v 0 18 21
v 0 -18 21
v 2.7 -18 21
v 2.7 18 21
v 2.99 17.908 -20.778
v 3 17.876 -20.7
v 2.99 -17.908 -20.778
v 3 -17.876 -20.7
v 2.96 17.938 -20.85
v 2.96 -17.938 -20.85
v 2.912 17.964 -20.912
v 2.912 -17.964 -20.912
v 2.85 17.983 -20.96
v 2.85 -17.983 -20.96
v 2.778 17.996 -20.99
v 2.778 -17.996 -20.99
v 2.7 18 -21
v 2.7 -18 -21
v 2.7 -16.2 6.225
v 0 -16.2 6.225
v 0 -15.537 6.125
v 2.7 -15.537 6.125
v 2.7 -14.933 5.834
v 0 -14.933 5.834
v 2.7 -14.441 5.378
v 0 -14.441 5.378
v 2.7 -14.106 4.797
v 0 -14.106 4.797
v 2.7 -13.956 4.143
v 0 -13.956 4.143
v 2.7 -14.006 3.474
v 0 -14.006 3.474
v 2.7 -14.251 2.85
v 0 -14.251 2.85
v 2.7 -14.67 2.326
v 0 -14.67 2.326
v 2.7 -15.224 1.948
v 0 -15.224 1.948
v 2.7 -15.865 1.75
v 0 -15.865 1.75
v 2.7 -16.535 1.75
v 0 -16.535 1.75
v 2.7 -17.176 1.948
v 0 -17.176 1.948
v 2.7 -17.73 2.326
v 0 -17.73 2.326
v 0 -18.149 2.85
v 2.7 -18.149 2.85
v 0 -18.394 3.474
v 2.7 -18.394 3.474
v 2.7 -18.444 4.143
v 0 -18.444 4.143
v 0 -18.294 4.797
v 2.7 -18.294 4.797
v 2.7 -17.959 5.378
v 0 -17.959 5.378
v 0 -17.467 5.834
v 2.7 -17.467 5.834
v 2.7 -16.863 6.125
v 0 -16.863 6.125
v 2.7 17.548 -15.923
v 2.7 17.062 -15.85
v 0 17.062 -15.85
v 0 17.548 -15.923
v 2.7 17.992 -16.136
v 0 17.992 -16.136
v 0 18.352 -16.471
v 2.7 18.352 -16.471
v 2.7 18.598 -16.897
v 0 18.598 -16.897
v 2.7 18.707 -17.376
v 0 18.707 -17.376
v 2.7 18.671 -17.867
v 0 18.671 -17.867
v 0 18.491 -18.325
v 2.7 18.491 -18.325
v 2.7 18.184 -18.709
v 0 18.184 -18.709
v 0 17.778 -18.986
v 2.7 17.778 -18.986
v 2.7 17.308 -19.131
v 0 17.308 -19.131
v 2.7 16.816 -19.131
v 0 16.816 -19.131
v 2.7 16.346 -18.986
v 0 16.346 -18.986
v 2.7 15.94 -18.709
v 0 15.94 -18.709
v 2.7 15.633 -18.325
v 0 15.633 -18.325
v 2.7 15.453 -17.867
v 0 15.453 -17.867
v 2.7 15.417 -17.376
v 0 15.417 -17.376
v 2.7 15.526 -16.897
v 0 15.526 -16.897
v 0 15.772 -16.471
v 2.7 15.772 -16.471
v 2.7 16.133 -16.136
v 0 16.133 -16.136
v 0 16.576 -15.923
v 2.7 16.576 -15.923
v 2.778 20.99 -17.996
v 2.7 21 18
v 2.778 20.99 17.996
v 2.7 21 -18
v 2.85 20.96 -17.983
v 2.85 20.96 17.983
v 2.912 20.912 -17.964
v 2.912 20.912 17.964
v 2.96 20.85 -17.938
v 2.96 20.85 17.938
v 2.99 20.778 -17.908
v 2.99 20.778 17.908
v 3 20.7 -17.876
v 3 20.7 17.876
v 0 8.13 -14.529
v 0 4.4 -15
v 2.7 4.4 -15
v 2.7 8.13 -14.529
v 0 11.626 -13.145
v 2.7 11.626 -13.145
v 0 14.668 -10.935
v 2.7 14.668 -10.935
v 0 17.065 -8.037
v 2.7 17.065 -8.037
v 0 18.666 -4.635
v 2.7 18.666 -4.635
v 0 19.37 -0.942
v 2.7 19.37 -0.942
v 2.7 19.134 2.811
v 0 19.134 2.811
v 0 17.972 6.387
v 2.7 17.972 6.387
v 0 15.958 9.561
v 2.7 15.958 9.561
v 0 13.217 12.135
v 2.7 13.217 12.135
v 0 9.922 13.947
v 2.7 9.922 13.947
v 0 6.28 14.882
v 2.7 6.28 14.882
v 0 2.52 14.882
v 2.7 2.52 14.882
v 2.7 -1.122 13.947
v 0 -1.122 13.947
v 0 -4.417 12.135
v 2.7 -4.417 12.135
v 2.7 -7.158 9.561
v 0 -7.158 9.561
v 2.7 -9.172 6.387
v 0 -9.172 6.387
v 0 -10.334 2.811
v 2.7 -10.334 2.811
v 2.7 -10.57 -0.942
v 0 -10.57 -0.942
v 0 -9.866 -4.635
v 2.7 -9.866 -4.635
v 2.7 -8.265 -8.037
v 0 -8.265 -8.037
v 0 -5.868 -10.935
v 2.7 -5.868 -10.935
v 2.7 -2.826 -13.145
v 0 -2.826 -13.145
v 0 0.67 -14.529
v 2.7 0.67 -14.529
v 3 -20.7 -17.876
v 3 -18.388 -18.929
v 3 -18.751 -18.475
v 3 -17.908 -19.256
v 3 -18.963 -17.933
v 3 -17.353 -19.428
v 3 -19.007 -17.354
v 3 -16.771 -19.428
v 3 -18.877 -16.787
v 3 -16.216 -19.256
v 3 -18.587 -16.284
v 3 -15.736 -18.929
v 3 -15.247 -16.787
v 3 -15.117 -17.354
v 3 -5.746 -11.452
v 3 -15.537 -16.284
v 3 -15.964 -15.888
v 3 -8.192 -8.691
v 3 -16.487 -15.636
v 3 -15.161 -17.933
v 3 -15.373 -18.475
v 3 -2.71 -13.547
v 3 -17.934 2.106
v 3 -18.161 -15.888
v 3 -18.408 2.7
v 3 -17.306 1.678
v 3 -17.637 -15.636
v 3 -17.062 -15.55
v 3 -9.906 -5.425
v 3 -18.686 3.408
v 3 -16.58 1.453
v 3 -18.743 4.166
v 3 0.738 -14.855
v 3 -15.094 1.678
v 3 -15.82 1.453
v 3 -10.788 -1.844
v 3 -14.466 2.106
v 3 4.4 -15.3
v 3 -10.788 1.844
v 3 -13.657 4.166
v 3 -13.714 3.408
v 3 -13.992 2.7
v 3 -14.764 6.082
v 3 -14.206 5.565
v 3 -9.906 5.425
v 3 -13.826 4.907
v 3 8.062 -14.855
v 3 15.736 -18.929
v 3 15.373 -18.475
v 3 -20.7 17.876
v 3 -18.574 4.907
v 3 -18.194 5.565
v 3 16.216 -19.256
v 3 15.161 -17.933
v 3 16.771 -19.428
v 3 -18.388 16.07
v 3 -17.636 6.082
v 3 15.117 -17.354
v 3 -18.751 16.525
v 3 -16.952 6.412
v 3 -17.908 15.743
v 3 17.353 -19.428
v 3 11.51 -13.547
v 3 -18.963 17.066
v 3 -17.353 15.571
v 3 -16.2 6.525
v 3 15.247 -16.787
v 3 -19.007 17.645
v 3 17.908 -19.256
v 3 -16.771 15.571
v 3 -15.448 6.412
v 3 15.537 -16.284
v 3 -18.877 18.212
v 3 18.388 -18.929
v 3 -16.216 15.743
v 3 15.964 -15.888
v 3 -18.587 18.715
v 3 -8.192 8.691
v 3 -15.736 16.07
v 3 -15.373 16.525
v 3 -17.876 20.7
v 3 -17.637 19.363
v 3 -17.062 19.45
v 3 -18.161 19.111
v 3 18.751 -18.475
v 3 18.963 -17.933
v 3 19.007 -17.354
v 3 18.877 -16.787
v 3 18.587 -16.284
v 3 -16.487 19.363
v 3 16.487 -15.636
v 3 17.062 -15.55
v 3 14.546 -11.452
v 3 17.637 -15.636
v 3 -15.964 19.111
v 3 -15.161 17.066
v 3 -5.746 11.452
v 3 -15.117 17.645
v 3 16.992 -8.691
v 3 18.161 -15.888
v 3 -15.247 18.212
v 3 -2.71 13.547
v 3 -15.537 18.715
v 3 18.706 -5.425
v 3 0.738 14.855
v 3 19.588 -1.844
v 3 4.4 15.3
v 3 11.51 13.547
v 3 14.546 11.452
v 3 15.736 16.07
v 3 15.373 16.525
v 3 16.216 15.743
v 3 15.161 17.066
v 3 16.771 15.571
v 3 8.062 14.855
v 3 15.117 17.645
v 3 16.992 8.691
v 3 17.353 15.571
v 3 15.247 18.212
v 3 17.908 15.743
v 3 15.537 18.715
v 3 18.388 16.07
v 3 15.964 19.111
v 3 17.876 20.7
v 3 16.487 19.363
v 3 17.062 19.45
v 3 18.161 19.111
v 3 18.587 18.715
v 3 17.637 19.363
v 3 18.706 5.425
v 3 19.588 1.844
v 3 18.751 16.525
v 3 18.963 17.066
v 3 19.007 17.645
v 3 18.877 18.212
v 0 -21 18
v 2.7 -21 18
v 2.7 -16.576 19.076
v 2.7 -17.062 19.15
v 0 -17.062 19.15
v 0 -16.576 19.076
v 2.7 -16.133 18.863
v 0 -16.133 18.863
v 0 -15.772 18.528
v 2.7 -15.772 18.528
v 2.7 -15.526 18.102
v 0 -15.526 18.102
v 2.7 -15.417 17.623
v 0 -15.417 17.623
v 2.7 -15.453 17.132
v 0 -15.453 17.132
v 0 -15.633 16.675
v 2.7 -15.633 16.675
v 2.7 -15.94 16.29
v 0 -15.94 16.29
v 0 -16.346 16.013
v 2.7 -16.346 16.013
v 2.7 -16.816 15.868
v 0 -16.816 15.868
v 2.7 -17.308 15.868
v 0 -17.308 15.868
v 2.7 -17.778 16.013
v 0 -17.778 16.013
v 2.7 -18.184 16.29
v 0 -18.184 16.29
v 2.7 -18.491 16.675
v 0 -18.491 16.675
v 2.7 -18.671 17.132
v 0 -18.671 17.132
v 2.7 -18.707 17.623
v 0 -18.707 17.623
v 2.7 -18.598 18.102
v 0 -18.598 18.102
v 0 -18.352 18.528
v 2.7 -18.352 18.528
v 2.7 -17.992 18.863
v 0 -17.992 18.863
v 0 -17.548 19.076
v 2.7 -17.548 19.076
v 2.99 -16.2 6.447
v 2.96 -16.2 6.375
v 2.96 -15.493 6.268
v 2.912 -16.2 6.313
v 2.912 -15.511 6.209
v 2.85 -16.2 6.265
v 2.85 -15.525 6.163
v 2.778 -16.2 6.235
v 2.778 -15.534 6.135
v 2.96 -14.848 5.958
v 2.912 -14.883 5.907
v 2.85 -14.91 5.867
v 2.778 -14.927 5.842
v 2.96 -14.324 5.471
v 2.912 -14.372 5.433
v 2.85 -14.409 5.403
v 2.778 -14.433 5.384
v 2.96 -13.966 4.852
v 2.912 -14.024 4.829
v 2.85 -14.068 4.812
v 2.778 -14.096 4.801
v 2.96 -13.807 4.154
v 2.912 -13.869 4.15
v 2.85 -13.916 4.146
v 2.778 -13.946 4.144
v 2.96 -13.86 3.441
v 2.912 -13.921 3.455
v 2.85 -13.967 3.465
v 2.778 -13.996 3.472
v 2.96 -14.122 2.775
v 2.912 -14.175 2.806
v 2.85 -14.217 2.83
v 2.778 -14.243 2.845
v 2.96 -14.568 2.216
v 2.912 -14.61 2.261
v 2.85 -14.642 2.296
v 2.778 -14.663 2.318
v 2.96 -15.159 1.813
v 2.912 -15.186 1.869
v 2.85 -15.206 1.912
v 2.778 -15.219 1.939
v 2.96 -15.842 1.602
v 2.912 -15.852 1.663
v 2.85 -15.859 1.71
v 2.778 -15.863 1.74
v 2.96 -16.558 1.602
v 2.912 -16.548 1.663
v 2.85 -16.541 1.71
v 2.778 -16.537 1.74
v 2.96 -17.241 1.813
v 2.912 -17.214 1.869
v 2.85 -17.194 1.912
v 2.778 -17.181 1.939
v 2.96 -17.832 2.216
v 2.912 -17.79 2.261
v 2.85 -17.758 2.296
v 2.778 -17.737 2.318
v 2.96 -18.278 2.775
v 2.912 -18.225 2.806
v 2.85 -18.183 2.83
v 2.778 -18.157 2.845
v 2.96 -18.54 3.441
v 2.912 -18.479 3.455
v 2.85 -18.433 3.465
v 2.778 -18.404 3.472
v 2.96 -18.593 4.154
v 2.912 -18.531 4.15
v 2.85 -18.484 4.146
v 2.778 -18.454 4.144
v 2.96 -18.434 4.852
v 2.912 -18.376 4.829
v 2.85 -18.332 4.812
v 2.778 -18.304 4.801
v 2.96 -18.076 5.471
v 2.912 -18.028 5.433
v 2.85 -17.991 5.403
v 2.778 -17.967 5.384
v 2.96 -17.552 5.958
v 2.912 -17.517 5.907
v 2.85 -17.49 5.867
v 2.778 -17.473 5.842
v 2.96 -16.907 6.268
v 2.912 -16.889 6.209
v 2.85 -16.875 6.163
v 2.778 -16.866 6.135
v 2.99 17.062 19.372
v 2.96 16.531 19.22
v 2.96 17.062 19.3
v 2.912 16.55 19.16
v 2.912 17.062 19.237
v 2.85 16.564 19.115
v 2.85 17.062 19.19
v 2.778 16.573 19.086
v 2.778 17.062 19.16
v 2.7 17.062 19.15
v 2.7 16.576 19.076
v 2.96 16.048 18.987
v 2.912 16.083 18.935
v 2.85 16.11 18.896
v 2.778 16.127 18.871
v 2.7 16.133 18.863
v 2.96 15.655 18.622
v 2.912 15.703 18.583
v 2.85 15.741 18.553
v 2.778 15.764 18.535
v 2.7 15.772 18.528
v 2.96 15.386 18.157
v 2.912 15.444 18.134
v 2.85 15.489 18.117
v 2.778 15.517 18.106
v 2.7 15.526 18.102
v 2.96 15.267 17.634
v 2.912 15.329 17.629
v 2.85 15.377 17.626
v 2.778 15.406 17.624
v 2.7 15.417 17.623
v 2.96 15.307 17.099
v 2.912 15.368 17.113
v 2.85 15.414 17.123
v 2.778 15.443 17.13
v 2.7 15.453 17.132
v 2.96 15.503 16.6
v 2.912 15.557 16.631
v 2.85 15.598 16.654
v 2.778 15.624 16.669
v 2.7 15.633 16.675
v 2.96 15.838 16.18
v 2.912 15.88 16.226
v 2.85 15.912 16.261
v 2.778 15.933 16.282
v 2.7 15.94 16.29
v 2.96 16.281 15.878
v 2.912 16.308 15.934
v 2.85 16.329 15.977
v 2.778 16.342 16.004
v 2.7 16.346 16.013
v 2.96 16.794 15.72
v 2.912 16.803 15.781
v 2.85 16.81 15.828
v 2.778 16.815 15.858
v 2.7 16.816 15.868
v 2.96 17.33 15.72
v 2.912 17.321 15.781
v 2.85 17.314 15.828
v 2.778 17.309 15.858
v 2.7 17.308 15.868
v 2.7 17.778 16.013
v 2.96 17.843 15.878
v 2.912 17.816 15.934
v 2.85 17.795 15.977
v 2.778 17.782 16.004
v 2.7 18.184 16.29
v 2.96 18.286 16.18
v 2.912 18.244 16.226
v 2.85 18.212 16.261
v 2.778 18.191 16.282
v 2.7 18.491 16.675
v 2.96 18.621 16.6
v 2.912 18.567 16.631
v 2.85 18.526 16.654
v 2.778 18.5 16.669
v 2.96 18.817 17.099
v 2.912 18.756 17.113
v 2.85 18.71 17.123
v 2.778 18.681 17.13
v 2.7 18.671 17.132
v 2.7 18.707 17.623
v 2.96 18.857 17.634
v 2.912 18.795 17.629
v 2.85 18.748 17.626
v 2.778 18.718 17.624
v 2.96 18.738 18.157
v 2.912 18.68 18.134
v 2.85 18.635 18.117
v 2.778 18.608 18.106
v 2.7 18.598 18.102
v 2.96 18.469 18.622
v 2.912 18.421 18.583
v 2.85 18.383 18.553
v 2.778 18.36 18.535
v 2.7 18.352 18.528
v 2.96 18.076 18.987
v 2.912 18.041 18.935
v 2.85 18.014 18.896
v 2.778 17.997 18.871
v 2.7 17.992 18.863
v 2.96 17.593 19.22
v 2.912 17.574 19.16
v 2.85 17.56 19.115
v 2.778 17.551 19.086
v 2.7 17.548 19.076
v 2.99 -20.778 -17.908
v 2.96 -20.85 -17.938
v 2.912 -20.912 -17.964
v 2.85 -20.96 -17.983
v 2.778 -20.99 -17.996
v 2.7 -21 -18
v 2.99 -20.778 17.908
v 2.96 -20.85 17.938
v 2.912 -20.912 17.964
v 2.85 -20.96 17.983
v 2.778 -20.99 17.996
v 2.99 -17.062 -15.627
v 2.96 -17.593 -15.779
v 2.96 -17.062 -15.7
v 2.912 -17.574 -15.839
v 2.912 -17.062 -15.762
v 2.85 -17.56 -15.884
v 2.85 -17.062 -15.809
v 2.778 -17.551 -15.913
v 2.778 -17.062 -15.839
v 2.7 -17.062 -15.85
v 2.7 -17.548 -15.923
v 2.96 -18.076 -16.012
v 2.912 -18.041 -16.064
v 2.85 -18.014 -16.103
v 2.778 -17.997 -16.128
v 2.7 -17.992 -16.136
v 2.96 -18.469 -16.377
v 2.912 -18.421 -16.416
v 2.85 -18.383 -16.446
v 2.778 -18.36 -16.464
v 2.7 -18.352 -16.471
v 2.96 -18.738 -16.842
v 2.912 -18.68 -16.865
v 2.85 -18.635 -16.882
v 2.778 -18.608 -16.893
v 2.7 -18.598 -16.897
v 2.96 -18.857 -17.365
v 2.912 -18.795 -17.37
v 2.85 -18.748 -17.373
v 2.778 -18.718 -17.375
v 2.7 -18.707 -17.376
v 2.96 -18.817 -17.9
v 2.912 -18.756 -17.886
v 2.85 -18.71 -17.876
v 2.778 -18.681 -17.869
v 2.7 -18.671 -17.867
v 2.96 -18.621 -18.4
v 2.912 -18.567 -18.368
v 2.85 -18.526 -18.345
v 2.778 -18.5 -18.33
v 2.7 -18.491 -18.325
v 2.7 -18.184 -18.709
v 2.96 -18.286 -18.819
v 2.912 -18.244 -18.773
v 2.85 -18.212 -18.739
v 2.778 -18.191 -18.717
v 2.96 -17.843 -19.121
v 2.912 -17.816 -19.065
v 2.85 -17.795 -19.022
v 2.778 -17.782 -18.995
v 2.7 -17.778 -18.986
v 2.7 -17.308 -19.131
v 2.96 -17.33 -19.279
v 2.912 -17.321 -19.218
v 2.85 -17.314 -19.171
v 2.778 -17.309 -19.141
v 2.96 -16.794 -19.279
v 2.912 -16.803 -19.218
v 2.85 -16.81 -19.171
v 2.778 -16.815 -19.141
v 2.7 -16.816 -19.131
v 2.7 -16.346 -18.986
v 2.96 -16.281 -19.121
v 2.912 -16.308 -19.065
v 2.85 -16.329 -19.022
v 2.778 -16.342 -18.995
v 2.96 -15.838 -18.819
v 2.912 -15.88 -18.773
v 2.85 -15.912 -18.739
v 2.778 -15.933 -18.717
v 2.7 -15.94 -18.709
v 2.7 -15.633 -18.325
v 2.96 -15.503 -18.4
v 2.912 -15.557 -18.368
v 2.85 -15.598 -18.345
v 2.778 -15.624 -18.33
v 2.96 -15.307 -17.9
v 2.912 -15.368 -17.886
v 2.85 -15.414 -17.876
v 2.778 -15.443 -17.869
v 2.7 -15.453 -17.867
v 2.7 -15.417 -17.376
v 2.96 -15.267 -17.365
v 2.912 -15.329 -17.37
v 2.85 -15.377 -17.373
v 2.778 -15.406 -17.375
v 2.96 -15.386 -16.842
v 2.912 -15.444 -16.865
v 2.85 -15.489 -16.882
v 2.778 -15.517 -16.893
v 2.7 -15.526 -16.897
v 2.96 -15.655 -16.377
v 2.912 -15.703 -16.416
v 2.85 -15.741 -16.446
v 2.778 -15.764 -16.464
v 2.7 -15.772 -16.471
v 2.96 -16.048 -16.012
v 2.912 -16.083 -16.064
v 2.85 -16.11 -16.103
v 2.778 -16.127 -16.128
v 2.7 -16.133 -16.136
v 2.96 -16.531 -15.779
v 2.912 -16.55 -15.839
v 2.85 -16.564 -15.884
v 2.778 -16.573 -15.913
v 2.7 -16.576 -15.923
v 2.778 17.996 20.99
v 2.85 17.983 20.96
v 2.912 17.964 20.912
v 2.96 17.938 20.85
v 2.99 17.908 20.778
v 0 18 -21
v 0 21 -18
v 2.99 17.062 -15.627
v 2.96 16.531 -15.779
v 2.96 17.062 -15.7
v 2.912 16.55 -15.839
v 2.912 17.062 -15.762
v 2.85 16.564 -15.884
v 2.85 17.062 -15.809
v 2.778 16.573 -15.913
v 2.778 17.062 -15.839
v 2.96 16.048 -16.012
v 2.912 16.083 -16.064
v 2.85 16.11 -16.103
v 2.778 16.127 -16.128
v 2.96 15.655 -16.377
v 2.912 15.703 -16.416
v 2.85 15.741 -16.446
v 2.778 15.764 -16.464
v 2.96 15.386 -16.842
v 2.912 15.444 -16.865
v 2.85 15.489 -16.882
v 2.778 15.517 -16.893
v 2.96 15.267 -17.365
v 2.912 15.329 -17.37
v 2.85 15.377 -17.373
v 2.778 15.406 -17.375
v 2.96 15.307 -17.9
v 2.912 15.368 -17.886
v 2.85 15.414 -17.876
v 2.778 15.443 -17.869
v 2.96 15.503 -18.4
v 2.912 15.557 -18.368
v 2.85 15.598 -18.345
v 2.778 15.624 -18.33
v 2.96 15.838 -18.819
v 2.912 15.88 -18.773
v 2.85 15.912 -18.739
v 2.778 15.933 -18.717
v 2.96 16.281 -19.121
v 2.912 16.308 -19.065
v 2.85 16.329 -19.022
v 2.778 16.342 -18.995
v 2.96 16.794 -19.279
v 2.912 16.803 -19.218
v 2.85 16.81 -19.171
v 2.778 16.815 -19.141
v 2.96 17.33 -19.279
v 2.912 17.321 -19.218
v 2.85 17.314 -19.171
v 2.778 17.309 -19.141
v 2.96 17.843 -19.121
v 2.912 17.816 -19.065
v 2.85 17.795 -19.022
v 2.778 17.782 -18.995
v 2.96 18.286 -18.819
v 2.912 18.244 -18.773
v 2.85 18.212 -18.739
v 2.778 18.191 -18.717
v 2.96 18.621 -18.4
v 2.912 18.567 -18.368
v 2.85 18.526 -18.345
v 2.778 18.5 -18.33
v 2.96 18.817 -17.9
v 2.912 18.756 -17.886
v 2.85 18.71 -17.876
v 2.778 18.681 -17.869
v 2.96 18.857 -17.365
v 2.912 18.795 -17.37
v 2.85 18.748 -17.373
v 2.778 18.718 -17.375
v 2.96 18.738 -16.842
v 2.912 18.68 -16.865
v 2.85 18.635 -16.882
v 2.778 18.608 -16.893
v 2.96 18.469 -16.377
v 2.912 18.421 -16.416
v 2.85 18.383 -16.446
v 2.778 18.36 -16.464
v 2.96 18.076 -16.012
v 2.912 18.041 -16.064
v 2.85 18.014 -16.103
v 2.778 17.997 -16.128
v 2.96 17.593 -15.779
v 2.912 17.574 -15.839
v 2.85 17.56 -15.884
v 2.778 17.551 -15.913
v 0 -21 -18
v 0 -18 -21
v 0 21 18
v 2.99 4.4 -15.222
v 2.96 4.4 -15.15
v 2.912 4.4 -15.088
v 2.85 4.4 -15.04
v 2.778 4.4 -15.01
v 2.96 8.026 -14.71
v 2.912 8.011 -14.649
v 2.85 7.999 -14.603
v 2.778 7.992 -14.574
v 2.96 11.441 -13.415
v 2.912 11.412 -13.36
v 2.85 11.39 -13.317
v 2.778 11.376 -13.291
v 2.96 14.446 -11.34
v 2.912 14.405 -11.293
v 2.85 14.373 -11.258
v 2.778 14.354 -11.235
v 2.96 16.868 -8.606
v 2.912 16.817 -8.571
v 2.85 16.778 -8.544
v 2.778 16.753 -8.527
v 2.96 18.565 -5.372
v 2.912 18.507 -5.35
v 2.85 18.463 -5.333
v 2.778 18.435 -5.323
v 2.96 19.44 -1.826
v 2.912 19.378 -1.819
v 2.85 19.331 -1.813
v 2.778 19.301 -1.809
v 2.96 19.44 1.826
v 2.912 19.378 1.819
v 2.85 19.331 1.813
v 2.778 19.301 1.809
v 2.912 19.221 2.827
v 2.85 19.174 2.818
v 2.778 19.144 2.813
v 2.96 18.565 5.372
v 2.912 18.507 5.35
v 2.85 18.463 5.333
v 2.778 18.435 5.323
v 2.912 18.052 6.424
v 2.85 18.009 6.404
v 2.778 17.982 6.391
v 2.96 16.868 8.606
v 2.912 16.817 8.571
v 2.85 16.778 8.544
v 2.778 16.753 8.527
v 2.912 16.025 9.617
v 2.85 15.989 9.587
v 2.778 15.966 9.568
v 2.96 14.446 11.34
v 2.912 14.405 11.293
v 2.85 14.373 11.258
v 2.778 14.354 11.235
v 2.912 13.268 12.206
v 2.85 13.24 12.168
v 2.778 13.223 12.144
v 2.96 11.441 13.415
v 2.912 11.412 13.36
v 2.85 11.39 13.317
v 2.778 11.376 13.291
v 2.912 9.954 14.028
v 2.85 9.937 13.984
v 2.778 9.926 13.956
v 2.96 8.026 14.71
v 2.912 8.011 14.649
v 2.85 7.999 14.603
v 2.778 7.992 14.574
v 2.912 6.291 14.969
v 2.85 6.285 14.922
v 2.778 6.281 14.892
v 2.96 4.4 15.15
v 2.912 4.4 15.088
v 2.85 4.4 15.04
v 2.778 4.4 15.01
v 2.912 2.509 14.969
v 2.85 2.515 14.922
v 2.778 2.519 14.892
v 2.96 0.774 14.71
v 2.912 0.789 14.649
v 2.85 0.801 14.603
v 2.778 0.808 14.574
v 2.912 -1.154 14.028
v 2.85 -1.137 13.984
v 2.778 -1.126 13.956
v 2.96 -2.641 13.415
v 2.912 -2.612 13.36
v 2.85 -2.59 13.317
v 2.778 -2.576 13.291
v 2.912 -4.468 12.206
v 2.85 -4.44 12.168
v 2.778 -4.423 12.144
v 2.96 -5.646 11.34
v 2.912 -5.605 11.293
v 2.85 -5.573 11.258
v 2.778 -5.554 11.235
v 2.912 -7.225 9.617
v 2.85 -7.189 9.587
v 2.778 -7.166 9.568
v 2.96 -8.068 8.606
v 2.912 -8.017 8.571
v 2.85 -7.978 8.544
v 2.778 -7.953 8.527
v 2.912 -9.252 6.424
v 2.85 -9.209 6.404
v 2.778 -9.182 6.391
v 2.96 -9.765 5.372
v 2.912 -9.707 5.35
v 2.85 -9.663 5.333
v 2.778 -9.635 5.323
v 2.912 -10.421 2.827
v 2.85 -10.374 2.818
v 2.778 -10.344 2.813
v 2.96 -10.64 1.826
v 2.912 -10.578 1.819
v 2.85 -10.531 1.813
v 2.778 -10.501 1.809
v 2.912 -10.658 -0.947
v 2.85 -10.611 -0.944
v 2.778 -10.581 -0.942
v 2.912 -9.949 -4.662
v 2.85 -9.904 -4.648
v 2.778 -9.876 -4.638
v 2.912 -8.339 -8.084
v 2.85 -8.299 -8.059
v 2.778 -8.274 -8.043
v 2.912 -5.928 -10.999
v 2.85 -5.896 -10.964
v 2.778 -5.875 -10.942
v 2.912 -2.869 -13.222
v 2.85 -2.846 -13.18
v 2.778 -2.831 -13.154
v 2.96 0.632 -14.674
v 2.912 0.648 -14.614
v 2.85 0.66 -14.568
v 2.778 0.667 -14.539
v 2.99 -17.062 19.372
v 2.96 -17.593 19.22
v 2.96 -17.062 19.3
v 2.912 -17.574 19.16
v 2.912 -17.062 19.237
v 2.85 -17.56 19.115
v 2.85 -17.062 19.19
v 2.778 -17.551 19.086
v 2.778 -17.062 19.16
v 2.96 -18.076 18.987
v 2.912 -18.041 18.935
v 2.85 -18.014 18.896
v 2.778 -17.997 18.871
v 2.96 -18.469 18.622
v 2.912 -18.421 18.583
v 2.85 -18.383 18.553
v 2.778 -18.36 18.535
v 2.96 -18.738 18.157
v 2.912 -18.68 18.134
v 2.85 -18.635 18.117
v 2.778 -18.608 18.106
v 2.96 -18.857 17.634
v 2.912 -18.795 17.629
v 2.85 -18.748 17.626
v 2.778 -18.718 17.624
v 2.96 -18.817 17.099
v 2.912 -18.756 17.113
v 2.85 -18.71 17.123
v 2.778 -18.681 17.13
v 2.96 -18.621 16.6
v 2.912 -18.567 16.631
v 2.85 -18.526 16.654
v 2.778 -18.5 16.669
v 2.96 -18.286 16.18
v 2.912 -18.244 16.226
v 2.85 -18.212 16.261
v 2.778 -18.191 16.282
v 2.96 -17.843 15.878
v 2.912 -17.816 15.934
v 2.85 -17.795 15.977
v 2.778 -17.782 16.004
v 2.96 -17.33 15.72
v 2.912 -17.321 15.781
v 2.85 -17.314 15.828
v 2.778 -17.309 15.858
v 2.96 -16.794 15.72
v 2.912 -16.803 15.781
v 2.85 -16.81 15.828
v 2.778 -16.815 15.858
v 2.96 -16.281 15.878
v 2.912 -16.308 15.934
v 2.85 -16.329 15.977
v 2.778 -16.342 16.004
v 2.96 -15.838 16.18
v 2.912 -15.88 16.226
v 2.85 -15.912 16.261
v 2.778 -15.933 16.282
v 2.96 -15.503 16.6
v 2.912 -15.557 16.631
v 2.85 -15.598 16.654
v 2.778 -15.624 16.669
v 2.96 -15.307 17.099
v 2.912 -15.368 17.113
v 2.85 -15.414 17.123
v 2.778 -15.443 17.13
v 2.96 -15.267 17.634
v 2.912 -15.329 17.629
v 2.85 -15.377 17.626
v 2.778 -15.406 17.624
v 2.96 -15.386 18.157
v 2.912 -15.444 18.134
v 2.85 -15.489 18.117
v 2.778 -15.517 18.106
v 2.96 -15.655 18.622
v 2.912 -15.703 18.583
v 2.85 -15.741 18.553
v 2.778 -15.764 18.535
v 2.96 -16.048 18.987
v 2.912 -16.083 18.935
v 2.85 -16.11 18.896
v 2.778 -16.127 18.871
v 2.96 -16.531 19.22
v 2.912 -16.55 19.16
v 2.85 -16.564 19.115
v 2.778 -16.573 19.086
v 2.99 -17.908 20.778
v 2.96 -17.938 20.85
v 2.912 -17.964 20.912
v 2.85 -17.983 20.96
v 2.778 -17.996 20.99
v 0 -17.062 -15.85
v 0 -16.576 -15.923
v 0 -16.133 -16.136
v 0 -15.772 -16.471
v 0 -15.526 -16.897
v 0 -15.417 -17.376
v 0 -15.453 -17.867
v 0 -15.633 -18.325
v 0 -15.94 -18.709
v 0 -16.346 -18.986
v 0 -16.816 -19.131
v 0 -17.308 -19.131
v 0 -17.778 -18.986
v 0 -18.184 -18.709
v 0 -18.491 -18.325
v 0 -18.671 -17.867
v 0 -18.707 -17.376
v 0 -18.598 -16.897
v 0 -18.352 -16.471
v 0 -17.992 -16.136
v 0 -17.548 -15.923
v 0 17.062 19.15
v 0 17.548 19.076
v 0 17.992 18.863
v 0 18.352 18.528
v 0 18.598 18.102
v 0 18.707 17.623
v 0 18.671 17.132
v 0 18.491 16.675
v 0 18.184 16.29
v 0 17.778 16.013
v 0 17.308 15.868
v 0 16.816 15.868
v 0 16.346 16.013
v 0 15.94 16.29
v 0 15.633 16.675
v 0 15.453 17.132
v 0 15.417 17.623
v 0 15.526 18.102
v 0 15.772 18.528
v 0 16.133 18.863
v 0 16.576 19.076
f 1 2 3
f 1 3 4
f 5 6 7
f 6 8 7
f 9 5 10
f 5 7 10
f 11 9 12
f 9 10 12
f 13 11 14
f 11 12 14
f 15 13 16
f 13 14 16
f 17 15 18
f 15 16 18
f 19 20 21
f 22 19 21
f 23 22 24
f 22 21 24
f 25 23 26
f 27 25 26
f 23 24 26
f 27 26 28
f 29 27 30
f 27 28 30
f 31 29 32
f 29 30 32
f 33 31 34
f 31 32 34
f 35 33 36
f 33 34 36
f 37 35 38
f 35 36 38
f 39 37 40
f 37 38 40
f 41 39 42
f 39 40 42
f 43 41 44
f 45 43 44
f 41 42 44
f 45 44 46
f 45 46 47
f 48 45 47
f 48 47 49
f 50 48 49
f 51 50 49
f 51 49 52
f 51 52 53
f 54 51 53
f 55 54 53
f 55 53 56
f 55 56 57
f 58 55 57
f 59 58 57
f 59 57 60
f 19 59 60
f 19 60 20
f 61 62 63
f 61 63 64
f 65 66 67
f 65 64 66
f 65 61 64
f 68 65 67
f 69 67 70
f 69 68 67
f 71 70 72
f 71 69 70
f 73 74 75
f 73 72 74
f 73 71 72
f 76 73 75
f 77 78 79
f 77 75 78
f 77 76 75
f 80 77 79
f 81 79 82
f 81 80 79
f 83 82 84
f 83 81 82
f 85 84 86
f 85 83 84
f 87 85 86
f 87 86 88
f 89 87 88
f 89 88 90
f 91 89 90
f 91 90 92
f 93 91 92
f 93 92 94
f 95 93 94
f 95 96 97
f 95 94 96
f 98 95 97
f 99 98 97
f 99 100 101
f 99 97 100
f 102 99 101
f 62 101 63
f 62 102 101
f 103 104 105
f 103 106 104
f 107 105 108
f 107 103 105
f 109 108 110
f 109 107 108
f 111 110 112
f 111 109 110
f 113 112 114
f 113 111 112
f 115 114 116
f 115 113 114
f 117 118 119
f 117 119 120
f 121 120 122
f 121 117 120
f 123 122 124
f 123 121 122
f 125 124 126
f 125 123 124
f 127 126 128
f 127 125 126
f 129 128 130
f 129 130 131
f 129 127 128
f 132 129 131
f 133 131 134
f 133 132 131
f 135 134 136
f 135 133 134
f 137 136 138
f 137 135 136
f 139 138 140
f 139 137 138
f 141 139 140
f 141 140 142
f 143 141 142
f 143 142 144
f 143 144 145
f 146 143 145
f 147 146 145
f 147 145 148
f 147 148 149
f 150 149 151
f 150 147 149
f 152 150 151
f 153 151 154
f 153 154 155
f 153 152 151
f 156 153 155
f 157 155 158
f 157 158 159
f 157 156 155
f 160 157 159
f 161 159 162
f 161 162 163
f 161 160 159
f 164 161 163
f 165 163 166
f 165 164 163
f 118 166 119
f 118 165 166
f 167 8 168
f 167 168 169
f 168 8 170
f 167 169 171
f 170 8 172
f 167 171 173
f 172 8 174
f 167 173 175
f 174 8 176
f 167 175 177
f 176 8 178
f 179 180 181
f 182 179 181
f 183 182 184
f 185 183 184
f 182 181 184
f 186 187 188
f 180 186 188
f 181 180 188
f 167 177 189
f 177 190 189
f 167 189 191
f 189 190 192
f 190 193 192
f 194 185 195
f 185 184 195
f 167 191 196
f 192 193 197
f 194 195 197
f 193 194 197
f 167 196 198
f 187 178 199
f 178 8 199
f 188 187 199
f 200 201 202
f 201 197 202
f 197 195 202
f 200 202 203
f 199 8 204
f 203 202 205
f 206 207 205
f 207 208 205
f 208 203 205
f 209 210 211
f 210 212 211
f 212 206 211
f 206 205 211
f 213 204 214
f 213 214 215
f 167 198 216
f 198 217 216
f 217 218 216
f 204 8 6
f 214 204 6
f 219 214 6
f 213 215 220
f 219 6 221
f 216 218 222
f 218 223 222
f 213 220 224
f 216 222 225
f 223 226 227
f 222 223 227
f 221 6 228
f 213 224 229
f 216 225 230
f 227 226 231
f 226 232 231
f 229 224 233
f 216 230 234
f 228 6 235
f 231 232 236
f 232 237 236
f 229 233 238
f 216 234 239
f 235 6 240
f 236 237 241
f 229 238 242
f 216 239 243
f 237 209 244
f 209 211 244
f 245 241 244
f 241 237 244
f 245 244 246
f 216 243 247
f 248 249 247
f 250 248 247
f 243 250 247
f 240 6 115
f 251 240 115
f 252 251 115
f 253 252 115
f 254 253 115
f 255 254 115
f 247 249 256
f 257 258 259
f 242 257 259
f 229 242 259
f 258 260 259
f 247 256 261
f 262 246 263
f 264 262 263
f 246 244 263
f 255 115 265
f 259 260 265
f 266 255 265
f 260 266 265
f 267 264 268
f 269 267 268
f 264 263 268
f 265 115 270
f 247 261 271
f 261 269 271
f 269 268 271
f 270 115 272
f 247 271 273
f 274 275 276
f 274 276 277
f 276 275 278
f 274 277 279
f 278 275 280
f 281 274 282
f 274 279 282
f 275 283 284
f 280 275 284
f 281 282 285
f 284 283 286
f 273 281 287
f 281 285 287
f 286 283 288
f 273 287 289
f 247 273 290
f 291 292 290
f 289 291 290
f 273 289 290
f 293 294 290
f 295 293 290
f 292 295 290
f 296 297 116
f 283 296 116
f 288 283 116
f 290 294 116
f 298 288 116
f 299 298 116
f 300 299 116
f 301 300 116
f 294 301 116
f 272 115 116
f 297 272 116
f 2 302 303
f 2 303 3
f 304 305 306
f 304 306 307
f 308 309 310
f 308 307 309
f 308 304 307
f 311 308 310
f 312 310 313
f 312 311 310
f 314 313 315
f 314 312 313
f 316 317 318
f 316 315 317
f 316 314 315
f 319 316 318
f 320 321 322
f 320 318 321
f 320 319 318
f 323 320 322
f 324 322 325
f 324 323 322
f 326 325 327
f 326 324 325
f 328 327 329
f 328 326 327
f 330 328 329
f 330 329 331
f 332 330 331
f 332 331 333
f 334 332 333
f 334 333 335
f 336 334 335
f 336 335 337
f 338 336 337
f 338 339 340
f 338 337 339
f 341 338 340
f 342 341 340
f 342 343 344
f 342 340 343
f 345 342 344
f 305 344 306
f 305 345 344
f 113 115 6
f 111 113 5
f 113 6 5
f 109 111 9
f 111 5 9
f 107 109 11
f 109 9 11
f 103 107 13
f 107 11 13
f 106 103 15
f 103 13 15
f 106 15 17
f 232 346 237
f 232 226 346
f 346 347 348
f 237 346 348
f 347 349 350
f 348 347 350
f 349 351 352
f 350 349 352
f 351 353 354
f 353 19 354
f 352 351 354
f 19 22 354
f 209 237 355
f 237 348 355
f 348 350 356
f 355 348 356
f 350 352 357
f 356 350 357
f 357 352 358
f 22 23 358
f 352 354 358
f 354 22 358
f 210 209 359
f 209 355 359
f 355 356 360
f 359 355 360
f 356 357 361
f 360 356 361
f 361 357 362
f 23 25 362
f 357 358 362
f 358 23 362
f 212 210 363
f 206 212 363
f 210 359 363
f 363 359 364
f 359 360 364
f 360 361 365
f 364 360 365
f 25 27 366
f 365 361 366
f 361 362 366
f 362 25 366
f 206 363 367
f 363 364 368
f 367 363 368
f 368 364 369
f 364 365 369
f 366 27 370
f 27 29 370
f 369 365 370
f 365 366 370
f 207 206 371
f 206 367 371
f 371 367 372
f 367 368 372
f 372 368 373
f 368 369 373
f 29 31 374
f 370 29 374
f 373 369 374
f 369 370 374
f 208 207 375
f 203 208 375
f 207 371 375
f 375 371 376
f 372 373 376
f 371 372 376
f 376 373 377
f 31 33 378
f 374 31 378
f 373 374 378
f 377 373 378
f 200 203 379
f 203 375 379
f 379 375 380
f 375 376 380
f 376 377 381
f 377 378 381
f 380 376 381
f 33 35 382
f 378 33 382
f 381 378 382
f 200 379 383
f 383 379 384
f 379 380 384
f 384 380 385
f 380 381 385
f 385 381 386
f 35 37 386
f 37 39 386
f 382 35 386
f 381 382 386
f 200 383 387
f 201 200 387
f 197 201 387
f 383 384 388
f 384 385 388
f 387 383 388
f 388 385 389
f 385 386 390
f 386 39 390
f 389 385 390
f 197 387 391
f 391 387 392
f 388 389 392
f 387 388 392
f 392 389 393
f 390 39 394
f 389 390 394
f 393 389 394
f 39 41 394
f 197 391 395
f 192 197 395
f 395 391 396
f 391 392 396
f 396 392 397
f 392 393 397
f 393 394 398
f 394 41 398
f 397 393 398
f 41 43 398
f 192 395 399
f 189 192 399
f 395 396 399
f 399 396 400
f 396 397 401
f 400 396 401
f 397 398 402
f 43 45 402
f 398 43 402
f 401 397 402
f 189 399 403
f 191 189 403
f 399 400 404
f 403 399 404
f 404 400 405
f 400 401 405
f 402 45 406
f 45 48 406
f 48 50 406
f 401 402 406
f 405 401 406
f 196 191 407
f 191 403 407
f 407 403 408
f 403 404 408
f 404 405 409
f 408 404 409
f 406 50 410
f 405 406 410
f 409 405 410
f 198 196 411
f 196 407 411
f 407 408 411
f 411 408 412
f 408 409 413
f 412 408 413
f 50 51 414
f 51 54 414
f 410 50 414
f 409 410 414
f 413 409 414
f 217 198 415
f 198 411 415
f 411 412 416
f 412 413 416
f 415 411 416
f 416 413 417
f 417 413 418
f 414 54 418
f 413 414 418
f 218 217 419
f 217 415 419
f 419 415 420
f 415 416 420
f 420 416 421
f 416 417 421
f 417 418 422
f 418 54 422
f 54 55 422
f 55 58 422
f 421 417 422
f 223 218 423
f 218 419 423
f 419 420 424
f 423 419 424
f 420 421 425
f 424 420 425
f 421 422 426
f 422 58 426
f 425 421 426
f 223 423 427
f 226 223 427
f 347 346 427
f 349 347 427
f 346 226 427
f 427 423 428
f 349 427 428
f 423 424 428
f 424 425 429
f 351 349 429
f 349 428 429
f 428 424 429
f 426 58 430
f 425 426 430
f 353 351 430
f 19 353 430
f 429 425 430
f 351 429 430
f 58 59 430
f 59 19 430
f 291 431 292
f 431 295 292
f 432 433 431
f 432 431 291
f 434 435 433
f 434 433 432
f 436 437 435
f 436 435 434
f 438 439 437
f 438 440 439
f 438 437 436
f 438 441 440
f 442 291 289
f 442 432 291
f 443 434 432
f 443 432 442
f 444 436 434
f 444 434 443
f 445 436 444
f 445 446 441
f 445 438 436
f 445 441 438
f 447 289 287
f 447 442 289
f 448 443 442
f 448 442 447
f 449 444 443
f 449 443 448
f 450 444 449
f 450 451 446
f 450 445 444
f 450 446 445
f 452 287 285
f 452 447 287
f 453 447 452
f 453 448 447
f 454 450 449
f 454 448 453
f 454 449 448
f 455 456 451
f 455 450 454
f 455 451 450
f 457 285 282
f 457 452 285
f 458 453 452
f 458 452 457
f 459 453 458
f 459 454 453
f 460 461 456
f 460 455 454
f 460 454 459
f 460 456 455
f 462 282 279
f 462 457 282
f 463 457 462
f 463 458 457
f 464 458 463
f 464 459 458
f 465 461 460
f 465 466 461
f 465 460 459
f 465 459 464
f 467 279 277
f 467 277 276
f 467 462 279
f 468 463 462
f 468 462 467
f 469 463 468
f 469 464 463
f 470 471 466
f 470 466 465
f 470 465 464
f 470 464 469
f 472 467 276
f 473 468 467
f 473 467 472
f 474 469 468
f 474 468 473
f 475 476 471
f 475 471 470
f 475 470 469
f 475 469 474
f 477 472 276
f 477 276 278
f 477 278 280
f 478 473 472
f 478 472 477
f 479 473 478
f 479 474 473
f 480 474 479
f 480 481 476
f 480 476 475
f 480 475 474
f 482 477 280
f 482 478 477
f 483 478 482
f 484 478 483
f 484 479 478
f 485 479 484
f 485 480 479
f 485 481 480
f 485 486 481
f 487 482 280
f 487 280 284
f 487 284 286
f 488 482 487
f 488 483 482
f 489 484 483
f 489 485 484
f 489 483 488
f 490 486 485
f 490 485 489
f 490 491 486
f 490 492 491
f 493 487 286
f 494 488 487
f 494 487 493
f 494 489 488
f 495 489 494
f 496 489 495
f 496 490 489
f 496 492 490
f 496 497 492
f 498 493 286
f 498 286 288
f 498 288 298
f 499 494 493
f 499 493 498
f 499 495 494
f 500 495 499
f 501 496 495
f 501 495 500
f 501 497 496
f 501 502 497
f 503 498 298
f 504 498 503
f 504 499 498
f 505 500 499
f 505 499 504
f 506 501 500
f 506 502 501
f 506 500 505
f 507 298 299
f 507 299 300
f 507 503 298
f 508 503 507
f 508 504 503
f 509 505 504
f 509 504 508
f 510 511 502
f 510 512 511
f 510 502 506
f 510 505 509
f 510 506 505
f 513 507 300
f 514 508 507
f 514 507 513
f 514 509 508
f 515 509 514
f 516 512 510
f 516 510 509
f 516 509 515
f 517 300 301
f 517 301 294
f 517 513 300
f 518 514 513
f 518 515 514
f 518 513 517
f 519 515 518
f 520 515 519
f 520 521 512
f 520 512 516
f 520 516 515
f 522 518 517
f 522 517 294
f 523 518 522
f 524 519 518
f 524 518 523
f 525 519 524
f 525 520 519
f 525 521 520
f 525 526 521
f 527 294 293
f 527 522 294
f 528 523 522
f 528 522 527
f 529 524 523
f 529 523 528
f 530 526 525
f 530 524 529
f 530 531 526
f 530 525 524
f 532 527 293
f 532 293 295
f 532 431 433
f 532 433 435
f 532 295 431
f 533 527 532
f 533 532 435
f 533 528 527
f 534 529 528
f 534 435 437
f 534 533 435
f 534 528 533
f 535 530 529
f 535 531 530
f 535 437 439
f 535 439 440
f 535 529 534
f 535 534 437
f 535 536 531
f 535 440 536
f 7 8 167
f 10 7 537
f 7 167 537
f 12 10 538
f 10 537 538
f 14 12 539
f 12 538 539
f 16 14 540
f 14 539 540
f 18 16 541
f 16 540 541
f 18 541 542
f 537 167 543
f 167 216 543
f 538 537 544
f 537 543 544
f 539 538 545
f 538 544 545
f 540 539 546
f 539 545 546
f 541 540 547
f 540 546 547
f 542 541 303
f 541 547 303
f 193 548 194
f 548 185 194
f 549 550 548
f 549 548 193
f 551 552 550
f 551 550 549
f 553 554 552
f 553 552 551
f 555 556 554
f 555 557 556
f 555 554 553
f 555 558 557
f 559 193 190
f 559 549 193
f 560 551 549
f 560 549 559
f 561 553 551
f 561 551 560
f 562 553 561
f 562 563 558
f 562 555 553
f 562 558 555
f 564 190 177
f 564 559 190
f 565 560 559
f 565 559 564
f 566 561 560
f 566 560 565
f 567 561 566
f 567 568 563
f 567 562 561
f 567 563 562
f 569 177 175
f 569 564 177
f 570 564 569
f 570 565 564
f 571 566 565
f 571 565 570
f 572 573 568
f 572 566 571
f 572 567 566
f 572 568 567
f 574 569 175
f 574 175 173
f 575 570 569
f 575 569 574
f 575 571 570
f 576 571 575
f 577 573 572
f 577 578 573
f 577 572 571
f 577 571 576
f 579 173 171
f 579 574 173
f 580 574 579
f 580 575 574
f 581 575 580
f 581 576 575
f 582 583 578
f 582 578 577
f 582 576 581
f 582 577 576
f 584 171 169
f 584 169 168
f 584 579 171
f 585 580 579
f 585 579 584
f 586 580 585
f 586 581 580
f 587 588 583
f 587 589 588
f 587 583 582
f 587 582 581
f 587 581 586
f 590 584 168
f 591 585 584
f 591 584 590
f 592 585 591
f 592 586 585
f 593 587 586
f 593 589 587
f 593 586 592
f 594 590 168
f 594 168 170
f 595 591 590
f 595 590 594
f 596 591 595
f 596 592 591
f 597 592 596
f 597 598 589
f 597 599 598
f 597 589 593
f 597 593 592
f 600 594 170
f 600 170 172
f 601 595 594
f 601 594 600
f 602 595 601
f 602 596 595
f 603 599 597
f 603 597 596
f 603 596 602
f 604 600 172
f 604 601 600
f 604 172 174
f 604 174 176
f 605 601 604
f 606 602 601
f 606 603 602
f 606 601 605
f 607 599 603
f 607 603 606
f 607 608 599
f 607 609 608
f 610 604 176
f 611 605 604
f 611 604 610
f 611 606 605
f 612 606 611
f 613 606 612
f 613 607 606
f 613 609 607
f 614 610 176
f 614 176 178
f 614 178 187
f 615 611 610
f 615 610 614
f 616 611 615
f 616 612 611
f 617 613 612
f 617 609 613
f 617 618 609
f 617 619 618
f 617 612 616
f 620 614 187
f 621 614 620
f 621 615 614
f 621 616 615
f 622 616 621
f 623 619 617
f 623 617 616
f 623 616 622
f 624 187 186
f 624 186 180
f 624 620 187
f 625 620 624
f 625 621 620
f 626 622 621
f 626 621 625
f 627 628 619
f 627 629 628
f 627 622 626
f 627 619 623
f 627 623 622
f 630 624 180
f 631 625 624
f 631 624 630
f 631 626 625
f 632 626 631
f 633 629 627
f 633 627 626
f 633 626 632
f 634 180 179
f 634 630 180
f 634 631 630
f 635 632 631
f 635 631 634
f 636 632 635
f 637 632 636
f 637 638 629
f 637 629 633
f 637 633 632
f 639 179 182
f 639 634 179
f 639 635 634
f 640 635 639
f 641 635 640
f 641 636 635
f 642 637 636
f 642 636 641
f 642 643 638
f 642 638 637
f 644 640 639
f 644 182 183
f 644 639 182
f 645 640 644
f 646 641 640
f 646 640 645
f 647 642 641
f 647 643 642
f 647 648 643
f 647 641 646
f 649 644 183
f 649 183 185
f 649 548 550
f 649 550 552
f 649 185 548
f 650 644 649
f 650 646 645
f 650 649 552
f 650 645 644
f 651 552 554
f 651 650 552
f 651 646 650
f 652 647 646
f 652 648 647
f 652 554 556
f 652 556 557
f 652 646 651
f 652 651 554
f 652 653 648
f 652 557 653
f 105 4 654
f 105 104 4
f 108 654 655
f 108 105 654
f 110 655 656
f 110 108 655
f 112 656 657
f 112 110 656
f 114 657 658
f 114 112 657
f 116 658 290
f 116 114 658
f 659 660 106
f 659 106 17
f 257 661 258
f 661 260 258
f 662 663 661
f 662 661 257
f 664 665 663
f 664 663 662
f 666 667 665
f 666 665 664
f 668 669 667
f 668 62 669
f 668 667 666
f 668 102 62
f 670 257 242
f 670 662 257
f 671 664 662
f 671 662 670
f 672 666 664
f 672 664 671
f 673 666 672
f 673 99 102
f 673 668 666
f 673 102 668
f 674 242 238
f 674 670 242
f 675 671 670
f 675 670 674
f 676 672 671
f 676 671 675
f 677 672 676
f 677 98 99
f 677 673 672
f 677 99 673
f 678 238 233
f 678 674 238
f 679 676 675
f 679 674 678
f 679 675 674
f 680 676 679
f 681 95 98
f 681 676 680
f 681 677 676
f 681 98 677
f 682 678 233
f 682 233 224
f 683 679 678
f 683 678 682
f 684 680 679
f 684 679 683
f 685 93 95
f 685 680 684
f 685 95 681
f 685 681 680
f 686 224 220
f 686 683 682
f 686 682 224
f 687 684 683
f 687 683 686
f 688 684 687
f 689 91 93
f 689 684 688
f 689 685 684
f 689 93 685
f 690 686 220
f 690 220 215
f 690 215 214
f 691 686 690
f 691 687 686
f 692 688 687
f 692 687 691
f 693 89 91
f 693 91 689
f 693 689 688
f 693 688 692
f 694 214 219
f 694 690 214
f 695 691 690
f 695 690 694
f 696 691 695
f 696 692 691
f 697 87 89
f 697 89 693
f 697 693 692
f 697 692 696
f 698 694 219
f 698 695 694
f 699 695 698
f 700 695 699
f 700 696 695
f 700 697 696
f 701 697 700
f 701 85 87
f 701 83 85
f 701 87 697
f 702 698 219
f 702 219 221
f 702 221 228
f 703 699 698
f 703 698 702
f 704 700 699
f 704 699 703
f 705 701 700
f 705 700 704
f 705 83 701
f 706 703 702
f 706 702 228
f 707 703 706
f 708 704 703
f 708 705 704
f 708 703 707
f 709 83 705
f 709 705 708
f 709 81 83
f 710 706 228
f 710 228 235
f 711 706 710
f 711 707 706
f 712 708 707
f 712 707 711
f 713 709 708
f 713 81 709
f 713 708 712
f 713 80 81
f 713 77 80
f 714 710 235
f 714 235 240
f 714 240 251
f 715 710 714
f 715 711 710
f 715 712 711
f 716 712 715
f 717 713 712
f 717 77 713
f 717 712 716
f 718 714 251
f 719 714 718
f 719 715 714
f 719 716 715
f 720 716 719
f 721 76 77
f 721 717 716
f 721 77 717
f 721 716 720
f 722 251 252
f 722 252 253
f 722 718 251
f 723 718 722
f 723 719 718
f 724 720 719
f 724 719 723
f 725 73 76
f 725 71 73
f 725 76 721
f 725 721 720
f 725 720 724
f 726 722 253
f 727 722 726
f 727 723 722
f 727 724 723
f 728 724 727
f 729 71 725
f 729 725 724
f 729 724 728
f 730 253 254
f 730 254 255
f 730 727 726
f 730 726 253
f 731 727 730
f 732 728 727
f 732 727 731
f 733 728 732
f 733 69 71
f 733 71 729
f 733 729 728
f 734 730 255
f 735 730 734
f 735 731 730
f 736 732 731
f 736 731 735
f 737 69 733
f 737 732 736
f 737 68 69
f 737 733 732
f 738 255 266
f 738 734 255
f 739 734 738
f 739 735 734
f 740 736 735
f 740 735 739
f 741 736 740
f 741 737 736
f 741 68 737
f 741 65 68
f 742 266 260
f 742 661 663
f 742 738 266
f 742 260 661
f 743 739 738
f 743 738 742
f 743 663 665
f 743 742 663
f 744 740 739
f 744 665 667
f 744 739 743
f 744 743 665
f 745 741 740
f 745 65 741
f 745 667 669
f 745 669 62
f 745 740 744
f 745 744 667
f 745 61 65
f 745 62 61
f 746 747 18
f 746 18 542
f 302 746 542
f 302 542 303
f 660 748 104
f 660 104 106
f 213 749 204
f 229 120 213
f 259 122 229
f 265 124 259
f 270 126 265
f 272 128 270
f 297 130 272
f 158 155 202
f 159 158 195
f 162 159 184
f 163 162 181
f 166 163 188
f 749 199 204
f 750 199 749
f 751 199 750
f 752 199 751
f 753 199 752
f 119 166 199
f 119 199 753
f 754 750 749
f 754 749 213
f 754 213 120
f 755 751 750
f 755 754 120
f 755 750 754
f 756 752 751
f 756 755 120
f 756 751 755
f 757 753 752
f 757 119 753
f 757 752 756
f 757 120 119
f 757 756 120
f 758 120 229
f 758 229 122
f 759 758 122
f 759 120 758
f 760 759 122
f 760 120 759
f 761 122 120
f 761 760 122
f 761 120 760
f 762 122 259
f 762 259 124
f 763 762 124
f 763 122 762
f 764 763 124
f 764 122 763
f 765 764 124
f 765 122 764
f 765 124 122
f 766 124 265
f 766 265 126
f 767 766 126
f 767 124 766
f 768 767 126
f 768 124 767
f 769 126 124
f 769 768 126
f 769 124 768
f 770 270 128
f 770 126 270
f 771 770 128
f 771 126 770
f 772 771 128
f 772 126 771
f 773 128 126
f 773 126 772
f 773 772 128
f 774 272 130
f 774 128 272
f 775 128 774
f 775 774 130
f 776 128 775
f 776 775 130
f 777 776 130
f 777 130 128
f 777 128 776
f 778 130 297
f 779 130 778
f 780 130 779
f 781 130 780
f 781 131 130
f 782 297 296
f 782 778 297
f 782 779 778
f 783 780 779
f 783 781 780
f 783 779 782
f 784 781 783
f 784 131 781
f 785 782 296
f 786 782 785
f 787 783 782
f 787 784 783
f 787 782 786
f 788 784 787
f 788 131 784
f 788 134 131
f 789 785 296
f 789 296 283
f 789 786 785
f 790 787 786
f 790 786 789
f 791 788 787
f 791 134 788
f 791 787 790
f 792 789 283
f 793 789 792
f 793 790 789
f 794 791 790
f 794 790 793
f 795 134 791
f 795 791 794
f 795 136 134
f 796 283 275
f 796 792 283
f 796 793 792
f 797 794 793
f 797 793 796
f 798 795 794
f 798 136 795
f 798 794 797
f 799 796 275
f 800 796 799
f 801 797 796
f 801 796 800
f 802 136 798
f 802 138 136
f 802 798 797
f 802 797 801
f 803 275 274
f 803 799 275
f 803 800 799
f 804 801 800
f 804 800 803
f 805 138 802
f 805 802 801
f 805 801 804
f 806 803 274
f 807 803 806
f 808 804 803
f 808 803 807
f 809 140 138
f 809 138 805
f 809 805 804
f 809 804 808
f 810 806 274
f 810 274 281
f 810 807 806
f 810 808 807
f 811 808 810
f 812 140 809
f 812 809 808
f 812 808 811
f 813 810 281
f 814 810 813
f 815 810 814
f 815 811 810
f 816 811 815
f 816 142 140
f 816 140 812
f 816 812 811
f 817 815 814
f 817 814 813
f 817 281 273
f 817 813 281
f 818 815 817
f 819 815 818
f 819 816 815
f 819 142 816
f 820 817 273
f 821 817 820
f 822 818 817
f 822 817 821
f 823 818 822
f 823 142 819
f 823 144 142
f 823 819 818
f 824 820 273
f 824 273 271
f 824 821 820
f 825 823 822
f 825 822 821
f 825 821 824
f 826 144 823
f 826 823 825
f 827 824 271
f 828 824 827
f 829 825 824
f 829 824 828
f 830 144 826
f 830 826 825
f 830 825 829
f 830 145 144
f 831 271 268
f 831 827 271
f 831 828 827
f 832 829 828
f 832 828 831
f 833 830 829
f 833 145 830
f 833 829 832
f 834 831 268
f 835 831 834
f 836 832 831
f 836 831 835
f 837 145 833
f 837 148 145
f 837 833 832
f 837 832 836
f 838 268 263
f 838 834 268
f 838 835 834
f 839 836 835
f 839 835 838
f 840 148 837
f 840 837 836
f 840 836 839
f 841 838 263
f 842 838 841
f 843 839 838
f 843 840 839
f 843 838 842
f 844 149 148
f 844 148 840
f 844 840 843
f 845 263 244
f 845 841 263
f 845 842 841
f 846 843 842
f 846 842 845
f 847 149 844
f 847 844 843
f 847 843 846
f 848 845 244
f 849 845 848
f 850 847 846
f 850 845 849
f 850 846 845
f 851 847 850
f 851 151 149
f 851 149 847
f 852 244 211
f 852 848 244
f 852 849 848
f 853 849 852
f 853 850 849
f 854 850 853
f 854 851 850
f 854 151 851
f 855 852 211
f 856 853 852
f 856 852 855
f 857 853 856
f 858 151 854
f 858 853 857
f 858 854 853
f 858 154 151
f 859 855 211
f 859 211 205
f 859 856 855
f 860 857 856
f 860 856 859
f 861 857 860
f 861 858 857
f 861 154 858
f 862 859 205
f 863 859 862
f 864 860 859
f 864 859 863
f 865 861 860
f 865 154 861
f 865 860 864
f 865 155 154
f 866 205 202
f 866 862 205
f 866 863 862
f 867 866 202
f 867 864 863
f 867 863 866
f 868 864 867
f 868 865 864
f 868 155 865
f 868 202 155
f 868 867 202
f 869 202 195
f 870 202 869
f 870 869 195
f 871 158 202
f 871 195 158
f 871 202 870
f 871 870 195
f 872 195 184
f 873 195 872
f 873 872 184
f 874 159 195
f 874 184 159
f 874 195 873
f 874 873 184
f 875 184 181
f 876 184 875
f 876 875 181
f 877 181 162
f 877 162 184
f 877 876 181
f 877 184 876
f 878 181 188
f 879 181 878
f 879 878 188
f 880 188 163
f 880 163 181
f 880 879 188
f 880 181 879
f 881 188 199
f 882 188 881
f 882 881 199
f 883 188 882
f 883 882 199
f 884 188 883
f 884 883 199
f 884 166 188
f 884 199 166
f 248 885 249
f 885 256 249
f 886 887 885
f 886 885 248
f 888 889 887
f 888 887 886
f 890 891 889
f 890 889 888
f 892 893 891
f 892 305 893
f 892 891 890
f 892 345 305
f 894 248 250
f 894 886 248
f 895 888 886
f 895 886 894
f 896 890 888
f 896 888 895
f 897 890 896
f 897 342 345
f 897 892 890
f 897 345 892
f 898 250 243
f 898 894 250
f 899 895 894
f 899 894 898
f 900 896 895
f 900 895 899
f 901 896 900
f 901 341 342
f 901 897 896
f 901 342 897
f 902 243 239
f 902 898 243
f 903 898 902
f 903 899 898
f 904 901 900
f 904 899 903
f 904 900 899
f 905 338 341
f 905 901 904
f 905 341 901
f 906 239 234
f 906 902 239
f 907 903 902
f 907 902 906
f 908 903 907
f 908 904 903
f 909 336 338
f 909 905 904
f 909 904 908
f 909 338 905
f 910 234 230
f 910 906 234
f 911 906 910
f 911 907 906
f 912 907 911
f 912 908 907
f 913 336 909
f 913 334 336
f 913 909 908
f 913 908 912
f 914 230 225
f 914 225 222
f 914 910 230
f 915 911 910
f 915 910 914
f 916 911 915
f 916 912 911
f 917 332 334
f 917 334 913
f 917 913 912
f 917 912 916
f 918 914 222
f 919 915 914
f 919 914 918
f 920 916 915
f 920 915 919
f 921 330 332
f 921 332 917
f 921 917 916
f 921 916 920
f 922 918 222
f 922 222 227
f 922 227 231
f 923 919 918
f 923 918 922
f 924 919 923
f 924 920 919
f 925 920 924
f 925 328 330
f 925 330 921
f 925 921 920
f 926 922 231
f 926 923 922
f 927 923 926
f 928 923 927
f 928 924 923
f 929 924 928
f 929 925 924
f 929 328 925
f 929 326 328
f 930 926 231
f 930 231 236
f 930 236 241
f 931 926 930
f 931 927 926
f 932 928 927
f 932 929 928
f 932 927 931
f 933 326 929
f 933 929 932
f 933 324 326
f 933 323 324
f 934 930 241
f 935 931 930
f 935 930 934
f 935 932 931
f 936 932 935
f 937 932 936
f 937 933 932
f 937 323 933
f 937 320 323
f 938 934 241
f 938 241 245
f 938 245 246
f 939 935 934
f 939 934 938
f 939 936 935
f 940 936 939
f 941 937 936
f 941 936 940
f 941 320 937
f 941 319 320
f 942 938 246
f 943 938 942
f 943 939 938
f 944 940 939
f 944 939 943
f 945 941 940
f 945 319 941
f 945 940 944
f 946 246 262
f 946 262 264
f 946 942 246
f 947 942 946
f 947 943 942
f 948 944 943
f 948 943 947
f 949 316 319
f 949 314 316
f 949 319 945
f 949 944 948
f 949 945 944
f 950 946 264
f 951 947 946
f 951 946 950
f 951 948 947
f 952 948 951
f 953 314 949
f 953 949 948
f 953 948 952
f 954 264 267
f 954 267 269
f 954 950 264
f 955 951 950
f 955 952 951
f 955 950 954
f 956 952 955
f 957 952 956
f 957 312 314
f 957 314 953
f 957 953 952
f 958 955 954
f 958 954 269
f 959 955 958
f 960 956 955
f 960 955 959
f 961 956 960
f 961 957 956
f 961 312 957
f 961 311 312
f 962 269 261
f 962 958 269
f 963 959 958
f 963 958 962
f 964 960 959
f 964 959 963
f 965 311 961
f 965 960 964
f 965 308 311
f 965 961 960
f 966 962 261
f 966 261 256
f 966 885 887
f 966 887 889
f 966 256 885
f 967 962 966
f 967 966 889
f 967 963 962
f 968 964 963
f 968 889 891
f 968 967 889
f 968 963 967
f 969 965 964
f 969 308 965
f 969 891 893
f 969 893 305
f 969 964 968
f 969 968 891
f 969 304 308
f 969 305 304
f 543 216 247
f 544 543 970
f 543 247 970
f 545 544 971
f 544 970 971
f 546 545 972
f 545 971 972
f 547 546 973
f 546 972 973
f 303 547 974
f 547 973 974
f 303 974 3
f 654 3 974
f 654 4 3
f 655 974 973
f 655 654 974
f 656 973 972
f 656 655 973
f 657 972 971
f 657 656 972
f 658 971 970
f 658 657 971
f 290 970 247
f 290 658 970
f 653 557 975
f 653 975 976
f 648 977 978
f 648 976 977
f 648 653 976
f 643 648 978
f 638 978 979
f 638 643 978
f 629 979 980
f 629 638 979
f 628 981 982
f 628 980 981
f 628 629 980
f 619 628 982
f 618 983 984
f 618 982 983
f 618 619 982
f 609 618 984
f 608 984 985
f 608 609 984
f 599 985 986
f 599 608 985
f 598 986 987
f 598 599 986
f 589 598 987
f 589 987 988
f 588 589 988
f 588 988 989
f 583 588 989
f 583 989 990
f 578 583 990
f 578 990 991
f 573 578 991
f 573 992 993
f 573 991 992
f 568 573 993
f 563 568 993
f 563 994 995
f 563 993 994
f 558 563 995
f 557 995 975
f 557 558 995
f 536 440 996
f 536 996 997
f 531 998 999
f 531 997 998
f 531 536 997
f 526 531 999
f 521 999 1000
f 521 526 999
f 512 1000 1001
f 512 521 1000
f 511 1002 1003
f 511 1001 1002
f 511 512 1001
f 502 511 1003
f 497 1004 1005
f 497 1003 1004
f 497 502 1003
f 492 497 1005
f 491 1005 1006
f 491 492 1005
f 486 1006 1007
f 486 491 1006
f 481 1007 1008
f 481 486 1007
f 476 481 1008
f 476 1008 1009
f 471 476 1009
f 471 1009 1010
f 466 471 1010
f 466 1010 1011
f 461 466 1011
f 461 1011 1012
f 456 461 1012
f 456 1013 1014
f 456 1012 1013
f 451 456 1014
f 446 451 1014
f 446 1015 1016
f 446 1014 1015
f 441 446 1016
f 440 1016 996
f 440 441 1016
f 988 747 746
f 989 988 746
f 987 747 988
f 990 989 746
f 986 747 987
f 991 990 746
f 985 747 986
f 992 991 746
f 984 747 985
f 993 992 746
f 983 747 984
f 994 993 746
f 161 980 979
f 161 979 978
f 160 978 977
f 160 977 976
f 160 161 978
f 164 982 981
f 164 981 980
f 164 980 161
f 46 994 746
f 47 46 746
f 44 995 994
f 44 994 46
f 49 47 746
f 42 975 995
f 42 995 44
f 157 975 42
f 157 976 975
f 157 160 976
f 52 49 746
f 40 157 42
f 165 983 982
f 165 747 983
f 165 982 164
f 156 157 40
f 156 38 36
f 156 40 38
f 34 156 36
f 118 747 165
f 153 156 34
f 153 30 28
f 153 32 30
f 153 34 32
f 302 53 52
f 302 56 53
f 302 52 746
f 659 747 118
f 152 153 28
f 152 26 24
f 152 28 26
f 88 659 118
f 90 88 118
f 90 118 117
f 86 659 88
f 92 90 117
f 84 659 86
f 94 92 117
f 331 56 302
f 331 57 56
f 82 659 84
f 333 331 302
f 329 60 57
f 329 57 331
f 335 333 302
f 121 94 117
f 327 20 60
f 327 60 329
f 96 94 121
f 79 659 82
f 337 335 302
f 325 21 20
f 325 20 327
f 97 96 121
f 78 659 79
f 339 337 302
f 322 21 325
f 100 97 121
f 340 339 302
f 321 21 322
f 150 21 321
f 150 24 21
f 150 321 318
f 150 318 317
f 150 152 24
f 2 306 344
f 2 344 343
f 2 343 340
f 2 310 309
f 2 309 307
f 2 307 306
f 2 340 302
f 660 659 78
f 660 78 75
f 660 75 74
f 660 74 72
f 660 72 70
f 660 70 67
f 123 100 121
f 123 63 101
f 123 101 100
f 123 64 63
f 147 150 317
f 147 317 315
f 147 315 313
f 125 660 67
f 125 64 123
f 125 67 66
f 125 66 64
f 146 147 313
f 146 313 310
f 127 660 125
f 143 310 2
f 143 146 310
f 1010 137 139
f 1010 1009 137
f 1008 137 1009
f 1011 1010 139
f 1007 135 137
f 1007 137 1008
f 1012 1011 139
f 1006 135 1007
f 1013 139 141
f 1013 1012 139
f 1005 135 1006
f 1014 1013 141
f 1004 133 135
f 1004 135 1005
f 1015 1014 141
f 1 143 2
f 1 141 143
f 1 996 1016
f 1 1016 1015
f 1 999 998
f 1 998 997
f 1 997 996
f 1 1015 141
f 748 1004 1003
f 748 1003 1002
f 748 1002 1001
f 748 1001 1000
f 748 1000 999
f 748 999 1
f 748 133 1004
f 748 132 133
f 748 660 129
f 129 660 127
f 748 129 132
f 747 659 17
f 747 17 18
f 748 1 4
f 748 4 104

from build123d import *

# Parameters (mm, degrees)
SKETCH1_R               = 15
BOSS_EXTRUDE1_DEPTH     = 3
CUT_EXTRUDE1_DEPTH      = 30.849623113
CUT_EXTRUDE1_DEPTH_BACK = 30.849623113
SKETCH2_R               = 1.65
SKETCH4_R               = 2.25
CUT_EXTRUDE2_DEPTH      = 30.849623113
FILLET1_R               = 0.3


with BuildPart() as part:
    # Sketch1 → Boss-Extrude1 (new body)
    with BuildSketch(Plane(origin=(0, 0, 0), x_dir=(0, 0, -1), z_dir=(1, 0, 0))):
        Polygon((-21, 18), (-18, 21), (18, 21), (21, 18), (21, -18), (18, -21), (-18, -21), (-21, -18), align=None)
        with Locations((0, 4.4)):
            Circle(SKETCH1_R, mode=Mode.SUBTRACT)
    extrude(amount=BOSS_EXTRUDE1_DEPTH)

    # Sketch2 → Cut-Extrude1 (cut, two sides: drawn at the far end of the back side and taken through both)
    with BuildSketch(Plane.ZY.offset(-CUT_EXTRUDE1_DEPTH_BACK)):
        with Locations((-17.499503476, 17.062044783)):
            Circle(SKETCH2_R)
        with Locations((-17.499503476, -17.062044783)):
            Circle(SKETCH2_R)
        with Locations((17.499503476, -17.062044783)):
            Circle(SKETCH2_R)
        with Locations((17.499503476, 17.062044783)):
            Circle(SKETCH2_R)
    extrude(amount=CUT_EXTRUDE1_DEPTH + CUT_EXTRUDE1_DEPTH_BACK, mode=Mode.SUBTRACT)

    # Sketch4 → Cut-Extrude2 (cut, through all)
    with BuildSketch(Plane.ZY):
        with Locations((3.974971526, -16.2)):
            Circle(SKETCH4_R)
    extrude(amount=-CUT_EXTRUDE2_DEPTH, mode=Mode.SUBTRACT)

    # Fillet1
    fillet1_edges = [part.edges().sort_by_distance(p)[0] for p in [
        (3, 0, 21),
        (3, -19.5, 19.5),
        (3, -21, 0),
        (3, 4.4, 15),
        (3, -19.5, -19.5),
        (3, 0, -21),
        (3, 19.5, -19.5),
        (3, -17.062044783, 15.849503476),
        (3, 17.062044783, -19.149503476),
        (3, 17.062044783, 15.849503476),
        (3, -17.062044783, -19.149503476),
        (3, 21, 0),
        (3, -16.2, 1.724971526),
        (3, 19.5, 19.5),
    ]]
    fillet(fillet1_edges, radius=FILLET1_R)


solid = part.part
